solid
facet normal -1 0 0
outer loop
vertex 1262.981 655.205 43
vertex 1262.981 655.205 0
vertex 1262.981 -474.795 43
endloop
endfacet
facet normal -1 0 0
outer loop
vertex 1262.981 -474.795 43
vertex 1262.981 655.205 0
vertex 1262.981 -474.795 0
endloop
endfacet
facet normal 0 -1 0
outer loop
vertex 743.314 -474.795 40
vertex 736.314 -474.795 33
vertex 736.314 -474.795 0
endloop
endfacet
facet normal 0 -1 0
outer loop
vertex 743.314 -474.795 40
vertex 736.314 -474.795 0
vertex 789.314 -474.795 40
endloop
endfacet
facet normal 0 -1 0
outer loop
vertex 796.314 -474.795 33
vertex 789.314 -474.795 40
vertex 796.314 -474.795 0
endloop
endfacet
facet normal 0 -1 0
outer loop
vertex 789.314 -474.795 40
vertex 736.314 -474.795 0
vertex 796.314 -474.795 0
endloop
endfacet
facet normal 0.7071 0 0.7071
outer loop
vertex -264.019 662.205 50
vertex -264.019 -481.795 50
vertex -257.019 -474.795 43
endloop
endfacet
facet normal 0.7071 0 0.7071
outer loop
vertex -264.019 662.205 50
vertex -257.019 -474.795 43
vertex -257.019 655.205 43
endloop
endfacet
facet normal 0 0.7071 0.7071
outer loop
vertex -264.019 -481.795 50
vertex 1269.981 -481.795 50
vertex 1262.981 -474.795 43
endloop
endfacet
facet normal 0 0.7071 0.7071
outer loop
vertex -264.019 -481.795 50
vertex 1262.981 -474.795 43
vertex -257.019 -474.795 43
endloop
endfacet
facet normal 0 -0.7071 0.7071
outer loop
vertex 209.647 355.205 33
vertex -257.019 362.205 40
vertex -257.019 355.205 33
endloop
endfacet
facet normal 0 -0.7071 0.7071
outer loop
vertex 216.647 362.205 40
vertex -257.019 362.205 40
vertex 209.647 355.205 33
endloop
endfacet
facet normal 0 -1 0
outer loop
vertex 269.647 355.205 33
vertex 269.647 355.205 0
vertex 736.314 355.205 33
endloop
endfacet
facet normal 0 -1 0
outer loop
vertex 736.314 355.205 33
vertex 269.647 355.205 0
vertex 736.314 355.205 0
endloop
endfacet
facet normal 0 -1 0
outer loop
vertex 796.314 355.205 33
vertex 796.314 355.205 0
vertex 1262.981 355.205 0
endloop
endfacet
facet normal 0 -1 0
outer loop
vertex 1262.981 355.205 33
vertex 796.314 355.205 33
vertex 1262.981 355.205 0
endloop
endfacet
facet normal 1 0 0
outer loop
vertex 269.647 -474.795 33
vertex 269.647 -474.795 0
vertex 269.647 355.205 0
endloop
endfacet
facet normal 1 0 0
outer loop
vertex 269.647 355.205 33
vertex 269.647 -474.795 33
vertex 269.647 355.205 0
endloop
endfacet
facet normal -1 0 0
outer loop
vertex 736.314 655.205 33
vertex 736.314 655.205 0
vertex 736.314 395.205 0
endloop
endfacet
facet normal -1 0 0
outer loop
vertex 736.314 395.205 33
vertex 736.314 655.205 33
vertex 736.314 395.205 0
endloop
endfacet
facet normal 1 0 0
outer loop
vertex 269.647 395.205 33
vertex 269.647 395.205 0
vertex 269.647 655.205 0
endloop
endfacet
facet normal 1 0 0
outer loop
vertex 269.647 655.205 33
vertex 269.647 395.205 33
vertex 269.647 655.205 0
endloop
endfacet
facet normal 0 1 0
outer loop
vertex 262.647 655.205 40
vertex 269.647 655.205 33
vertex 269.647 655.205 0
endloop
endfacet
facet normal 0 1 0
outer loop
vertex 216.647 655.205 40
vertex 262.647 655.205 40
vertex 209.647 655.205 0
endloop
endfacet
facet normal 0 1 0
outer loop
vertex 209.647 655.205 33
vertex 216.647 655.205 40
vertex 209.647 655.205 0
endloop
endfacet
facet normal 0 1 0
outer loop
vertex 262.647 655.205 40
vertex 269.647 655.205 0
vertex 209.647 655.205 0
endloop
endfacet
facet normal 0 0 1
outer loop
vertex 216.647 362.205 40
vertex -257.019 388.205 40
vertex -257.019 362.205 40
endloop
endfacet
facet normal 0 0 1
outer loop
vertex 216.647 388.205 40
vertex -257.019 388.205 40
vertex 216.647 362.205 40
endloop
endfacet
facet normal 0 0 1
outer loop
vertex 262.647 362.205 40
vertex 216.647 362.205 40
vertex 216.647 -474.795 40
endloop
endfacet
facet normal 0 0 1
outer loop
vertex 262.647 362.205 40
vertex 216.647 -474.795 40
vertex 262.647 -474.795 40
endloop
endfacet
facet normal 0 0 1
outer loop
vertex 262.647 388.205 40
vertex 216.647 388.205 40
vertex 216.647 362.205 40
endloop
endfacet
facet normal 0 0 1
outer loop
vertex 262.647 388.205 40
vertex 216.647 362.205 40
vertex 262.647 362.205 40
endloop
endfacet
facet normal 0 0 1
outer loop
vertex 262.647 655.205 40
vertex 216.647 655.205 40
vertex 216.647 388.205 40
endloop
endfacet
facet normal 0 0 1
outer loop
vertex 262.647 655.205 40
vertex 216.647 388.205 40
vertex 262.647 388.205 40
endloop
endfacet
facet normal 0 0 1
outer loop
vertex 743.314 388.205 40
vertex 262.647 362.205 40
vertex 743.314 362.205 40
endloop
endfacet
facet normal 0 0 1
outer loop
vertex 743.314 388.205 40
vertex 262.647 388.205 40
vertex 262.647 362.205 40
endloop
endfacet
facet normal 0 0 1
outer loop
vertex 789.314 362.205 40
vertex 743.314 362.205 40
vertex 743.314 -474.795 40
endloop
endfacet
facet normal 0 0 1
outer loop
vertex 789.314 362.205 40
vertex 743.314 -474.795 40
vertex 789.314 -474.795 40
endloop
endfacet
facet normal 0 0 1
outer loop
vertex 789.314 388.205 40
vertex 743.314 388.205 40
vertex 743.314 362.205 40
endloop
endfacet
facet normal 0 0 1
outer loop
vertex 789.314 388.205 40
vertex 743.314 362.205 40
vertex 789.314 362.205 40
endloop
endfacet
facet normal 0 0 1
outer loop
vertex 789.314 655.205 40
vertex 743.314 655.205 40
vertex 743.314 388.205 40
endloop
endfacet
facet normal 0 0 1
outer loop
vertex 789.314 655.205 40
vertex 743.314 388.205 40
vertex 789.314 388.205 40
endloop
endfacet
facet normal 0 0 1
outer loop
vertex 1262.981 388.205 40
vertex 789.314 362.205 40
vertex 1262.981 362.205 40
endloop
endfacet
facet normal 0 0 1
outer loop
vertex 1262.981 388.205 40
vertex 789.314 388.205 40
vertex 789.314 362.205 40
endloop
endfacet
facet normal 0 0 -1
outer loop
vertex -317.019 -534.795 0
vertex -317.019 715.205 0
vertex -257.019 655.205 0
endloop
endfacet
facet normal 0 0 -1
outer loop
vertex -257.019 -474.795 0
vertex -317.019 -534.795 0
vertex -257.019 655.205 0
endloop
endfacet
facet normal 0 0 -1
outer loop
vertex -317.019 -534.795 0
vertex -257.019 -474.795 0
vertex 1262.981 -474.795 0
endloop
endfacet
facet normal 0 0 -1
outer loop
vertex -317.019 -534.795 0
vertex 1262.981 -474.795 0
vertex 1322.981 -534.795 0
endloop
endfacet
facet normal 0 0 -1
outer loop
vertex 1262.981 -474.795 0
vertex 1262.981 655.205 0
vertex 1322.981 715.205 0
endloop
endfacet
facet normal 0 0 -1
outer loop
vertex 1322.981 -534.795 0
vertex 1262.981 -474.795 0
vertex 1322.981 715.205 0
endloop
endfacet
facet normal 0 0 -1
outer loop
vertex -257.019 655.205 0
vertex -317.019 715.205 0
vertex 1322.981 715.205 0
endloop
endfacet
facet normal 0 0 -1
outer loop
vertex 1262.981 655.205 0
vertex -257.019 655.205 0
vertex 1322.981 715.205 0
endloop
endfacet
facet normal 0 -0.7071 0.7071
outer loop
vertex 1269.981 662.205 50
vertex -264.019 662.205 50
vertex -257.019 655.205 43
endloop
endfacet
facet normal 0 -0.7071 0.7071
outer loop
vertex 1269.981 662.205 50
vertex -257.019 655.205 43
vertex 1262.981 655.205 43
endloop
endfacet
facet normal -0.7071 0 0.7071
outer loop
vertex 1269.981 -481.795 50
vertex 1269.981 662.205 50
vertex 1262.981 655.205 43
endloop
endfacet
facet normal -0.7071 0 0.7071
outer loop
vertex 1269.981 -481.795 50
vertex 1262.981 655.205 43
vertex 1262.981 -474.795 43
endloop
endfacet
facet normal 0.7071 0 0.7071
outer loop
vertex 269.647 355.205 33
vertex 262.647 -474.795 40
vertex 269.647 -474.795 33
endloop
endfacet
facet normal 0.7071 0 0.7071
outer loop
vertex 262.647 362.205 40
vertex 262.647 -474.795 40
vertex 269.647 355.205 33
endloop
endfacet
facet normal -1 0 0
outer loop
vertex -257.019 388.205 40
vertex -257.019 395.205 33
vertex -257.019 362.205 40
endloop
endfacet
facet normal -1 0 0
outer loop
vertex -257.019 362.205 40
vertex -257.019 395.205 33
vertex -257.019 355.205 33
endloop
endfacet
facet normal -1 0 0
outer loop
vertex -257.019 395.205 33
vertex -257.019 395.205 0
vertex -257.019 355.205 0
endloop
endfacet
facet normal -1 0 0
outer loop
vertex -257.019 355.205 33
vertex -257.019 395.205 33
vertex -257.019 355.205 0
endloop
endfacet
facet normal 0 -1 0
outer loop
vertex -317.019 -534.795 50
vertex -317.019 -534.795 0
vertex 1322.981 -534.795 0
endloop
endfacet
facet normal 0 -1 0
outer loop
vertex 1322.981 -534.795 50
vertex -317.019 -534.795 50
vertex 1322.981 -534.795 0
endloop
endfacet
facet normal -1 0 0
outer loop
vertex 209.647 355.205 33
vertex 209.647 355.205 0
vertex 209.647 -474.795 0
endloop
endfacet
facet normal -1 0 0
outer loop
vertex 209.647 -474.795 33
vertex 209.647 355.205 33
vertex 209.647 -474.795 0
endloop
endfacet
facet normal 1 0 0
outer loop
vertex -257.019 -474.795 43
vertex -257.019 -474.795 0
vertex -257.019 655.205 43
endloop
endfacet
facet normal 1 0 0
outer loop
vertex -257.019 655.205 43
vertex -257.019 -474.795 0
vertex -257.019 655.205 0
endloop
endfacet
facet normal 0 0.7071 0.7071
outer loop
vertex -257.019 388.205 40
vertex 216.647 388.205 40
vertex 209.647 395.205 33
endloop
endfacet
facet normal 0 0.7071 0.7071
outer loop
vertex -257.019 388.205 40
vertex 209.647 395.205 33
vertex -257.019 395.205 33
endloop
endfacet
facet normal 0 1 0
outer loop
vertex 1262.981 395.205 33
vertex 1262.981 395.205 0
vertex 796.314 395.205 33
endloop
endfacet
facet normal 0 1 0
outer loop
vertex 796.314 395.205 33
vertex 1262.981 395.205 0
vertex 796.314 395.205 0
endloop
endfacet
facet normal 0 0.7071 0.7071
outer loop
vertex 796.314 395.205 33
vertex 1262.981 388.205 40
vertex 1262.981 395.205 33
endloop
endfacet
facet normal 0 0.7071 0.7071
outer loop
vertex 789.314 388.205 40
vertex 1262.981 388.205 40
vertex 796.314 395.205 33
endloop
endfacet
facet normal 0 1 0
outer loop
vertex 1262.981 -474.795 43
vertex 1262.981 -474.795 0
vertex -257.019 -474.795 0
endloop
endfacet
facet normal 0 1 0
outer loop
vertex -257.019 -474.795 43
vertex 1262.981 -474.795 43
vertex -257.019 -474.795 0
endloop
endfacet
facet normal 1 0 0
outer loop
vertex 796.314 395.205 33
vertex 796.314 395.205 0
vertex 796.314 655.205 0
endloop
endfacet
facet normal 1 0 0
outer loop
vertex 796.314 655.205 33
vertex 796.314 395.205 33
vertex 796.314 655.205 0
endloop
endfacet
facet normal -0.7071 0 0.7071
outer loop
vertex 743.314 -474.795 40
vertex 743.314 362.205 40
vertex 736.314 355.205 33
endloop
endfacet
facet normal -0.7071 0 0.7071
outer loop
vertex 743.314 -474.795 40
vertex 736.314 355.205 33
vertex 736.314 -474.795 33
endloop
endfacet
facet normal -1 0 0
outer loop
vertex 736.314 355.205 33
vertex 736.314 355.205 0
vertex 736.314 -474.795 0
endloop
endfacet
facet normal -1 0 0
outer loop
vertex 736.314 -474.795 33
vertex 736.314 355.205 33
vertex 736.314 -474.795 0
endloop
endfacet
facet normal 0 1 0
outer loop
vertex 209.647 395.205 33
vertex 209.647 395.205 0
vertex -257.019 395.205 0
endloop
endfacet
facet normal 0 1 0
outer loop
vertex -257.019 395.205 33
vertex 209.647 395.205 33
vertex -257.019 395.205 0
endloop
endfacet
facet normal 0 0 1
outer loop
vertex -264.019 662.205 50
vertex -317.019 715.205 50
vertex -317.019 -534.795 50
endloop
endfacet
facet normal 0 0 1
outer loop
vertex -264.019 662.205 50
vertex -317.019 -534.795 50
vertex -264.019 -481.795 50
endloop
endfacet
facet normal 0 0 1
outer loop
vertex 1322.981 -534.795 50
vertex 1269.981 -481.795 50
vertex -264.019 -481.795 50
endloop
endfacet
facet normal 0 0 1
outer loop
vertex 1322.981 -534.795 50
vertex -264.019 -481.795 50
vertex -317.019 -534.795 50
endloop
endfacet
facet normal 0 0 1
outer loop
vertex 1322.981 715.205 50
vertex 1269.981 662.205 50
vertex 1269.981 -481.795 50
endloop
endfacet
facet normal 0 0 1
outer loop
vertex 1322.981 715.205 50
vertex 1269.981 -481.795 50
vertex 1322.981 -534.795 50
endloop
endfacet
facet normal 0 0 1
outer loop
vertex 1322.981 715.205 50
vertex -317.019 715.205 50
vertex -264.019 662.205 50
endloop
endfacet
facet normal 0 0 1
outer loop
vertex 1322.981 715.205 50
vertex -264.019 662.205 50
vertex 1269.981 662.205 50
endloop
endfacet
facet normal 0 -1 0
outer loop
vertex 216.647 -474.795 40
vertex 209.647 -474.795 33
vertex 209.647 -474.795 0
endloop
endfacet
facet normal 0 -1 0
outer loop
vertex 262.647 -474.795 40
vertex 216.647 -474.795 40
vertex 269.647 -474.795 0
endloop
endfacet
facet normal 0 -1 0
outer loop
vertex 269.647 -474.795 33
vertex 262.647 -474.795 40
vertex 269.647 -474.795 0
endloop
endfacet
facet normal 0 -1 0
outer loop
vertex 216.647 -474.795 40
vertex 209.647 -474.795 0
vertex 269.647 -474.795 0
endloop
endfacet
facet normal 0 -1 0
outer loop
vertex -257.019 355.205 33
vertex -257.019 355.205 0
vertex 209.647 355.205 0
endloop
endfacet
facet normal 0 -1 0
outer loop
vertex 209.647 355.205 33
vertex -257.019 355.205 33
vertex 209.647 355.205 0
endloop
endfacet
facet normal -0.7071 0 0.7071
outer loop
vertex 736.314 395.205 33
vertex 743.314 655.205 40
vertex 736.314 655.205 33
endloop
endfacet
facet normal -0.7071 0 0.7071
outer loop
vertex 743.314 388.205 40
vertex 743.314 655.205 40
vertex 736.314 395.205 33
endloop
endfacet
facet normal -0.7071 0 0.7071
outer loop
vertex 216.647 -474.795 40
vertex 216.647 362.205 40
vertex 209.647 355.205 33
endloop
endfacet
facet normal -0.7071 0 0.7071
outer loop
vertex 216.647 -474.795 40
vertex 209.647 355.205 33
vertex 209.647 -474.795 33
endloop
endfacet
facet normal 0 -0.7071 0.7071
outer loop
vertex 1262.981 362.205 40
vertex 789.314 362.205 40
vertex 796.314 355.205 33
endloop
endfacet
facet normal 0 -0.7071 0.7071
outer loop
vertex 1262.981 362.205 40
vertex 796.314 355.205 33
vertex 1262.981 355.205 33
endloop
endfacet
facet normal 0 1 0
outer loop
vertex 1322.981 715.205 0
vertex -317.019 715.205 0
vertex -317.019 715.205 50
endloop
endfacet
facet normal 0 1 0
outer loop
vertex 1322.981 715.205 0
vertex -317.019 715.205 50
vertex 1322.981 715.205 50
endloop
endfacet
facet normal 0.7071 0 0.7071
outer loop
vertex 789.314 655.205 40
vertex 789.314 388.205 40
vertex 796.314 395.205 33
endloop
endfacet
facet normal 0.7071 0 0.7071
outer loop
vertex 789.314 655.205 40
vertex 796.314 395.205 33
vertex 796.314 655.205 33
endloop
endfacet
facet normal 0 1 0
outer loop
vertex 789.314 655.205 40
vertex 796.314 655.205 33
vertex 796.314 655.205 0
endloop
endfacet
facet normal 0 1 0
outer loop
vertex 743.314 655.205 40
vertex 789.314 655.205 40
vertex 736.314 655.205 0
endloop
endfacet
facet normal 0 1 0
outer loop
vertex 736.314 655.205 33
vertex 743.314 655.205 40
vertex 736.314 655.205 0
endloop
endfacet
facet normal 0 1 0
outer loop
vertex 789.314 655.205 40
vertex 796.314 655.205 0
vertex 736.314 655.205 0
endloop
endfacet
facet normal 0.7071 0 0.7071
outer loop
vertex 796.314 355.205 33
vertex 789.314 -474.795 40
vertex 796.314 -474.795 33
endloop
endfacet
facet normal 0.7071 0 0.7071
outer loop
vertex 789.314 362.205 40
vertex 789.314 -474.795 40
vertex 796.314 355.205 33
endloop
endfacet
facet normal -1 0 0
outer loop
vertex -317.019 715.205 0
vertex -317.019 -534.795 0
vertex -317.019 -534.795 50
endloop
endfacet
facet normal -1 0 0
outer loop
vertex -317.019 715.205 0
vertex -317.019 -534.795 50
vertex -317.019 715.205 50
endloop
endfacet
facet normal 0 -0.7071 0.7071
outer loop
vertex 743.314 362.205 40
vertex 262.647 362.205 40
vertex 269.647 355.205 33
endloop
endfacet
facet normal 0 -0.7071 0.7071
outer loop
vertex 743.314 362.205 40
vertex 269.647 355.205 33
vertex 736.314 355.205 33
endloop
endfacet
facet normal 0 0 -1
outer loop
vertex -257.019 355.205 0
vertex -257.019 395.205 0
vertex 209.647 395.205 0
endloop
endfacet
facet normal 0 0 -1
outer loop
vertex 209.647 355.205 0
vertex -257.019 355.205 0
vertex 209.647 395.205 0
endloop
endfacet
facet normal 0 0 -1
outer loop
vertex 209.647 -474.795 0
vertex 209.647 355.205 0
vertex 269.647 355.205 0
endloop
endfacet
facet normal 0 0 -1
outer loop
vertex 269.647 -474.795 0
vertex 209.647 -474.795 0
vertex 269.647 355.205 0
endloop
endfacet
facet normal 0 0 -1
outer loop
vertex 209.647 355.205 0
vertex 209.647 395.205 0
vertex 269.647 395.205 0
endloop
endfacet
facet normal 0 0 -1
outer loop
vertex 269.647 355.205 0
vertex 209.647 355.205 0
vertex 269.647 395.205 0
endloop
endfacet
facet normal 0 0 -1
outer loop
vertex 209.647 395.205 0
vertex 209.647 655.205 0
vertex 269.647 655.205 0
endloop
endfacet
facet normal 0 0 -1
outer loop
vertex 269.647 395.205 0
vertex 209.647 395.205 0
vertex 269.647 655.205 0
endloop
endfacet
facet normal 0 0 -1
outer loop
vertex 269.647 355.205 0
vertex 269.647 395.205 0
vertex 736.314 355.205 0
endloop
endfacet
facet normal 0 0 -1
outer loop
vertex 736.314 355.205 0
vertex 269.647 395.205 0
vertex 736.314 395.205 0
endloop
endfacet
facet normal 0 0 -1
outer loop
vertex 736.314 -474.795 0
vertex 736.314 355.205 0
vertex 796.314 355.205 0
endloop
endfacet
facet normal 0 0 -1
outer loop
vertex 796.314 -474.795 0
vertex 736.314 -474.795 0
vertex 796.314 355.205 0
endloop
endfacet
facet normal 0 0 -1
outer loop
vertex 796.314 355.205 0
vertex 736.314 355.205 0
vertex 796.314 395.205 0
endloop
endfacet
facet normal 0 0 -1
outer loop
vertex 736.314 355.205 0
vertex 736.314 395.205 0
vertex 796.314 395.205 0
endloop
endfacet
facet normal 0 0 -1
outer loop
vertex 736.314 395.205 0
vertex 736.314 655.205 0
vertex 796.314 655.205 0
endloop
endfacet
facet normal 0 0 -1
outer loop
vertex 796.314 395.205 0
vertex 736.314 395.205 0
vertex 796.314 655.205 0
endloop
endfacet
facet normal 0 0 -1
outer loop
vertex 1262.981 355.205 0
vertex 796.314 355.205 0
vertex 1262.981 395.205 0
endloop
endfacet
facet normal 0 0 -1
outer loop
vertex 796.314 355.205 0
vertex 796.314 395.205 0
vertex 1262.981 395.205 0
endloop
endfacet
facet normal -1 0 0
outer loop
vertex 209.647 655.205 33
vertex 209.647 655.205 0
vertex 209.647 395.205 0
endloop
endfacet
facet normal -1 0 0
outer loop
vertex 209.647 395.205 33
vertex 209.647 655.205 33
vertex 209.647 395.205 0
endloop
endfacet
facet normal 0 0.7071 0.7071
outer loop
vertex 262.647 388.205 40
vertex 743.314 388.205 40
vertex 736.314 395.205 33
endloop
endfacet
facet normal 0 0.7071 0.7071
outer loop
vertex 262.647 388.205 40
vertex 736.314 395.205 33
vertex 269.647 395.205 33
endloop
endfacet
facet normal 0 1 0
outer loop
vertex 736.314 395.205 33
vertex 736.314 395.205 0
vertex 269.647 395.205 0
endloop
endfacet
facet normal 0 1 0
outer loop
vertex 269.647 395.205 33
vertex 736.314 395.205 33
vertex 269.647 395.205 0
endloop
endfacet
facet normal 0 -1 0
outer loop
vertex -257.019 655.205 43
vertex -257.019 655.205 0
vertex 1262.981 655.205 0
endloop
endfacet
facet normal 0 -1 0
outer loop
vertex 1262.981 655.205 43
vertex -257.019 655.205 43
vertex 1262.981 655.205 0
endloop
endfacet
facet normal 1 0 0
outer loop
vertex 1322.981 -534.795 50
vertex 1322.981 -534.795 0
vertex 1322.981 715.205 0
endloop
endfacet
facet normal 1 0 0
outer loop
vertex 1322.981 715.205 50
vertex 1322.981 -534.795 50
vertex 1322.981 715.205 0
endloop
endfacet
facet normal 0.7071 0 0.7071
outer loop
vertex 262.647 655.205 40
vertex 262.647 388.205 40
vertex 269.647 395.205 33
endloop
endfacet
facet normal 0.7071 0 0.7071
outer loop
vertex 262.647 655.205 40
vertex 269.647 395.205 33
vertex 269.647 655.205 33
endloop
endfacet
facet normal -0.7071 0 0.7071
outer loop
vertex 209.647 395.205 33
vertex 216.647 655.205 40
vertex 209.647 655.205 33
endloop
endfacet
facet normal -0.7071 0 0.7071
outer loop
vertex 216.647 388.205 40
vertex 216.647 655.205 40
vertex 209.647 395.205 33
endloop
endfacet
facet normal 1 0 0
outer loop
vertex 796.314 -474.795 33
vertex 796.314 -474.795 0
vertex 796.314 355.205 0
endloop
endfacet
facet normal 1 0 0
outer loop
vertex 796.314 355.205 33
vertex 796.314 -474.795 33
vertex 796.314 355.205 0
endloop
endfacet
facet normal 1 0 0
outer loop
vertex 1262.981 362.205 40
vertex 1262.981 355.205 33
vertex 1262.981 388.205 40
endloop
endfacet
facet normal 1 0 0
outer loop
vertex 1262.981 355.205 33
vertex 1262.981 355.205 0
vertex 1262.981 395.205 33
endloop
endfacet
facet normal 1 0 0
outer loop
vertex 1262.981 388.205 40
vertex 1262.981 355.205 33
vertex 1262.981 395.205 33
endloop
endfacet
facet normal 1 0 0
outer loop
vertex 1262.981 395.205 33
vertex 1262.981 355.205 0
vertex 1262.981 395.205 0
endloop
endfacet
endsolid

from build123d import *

# Parameters (mm, degrees)
F0_W      = 1640
F0_H      = 1250
F1_DEPTH  = 50
F2_DEPTH  = 40
F3_SIZE   = 7
F3_2_SIZE = 7


# Not quite as in the source:
# - a feature names something its author has since deleted; it is built from what else it names


with BuildPart() as f1:
    # F0 (on Top) → F1 (new body)
    with BuildSketch(Plane.XY):
        with Locations((502.9808287794, 90.2047318473)):
            Rectangle(F0_W, F0_H)
        Polygon((-257.0191712206, 395.2047318473), (-257.0191712206, 655.2047318473), (209.6474954461, 655.2047318473), (269.6474954461, 655.2047318473), (736.3141621128, 655.2047318473), (796.3141621128, 655.2047318473), (1262.9808287794, 655.2047318473), (1262.9808287794, 395.2047318473), (1262.9808287794, 355.2047318473), (1262.9808287794, -474.7952681527), (796.3141621128, -474.7952681527), (736.3141621128, -474.7952681527), (269.6474954461, -474.7952681527), (209.6474954461, -474.7952681527), (-257.0191712206, -474.7952681527), (-257.0191712206, 355.2047318473), align=None, mode=Mode.SUBTRACT)
    extrude(amount=F1_DEPTH)

    # F3
    f3_edges = [f1.edges().sort_by_distance(p)[0] for p in [
        (-257.019171, 90.204732, 50),
        (502.980829, 655.204732, 50),
        (502.980829, -474.795268, 50),
        (1262.980829, 90.204732, 50),
    ]]
    chamfer(f3_edges, length=F3_SIZE)


with BuildPart() as f2:
    # F0 (on Top) → F2 (new body)
    with BuildSketch(Plane.XY):
        Polygon((269.6474954461, 655.2047318473), (209.6474954461, 655.2047318473), (209.6474954461, 395.2047318473), (-257.0191712206, 395.2047318473), (-257.0191712206, 355.2047318473), (209.6474954461, 355.2047318473), (209.6474954461, -474.7952681527), (269.6474954461, -474.7952681527), (269.6474954461, 355.2047318473), (736.3141621128, 355.2047318473), (736.3141621128, -474.7952681527), (796.3141621128, -474.7952681527), (796.3141621128, 355.2047318473), (1262.9808287794, 355.2047318473), (1262.9808287794, 395.2047318473), (796.3141621128, 395.2047318473), (796.3141621128, 655.2047318473), (736.3141621128, 655.2047318473), (736.3141621128, 395.2047318473), (269.6474954461, 395.2047318473), align=None)
    extrude(amount=F2_DEPTH)

    # F3#2
    f3_2_edges = [f2.edges().sort_by_distance(p)[0] for p in [
        (-23.685838, 355.204732, 40),
        (502.980829, 355.204732, 40),
        (269.647495, -59.795268, 40),
        (796.314162, -59.795268, 40),
        (796.314162, 525.204732, 40),
        (269.647495, 525.204732, 40),
        (209.647495, -59.795268, 40),
        (209.647495, 525.204732, 40),
        (-23.685838, 395.204732, 40),
        (502.980829, 395.204732, 40),
        (1029.647495, 395.204732, 40),
        (1029.647495, 355.204732, 40),
        (736.314162, -59.795268, 40),
        (736.314162, 525.204732, 40),
    ]]
    chamfer(f3_2_edges, length=F3_2_SIZE)


solid = Compound([f1.part, f2.part])
